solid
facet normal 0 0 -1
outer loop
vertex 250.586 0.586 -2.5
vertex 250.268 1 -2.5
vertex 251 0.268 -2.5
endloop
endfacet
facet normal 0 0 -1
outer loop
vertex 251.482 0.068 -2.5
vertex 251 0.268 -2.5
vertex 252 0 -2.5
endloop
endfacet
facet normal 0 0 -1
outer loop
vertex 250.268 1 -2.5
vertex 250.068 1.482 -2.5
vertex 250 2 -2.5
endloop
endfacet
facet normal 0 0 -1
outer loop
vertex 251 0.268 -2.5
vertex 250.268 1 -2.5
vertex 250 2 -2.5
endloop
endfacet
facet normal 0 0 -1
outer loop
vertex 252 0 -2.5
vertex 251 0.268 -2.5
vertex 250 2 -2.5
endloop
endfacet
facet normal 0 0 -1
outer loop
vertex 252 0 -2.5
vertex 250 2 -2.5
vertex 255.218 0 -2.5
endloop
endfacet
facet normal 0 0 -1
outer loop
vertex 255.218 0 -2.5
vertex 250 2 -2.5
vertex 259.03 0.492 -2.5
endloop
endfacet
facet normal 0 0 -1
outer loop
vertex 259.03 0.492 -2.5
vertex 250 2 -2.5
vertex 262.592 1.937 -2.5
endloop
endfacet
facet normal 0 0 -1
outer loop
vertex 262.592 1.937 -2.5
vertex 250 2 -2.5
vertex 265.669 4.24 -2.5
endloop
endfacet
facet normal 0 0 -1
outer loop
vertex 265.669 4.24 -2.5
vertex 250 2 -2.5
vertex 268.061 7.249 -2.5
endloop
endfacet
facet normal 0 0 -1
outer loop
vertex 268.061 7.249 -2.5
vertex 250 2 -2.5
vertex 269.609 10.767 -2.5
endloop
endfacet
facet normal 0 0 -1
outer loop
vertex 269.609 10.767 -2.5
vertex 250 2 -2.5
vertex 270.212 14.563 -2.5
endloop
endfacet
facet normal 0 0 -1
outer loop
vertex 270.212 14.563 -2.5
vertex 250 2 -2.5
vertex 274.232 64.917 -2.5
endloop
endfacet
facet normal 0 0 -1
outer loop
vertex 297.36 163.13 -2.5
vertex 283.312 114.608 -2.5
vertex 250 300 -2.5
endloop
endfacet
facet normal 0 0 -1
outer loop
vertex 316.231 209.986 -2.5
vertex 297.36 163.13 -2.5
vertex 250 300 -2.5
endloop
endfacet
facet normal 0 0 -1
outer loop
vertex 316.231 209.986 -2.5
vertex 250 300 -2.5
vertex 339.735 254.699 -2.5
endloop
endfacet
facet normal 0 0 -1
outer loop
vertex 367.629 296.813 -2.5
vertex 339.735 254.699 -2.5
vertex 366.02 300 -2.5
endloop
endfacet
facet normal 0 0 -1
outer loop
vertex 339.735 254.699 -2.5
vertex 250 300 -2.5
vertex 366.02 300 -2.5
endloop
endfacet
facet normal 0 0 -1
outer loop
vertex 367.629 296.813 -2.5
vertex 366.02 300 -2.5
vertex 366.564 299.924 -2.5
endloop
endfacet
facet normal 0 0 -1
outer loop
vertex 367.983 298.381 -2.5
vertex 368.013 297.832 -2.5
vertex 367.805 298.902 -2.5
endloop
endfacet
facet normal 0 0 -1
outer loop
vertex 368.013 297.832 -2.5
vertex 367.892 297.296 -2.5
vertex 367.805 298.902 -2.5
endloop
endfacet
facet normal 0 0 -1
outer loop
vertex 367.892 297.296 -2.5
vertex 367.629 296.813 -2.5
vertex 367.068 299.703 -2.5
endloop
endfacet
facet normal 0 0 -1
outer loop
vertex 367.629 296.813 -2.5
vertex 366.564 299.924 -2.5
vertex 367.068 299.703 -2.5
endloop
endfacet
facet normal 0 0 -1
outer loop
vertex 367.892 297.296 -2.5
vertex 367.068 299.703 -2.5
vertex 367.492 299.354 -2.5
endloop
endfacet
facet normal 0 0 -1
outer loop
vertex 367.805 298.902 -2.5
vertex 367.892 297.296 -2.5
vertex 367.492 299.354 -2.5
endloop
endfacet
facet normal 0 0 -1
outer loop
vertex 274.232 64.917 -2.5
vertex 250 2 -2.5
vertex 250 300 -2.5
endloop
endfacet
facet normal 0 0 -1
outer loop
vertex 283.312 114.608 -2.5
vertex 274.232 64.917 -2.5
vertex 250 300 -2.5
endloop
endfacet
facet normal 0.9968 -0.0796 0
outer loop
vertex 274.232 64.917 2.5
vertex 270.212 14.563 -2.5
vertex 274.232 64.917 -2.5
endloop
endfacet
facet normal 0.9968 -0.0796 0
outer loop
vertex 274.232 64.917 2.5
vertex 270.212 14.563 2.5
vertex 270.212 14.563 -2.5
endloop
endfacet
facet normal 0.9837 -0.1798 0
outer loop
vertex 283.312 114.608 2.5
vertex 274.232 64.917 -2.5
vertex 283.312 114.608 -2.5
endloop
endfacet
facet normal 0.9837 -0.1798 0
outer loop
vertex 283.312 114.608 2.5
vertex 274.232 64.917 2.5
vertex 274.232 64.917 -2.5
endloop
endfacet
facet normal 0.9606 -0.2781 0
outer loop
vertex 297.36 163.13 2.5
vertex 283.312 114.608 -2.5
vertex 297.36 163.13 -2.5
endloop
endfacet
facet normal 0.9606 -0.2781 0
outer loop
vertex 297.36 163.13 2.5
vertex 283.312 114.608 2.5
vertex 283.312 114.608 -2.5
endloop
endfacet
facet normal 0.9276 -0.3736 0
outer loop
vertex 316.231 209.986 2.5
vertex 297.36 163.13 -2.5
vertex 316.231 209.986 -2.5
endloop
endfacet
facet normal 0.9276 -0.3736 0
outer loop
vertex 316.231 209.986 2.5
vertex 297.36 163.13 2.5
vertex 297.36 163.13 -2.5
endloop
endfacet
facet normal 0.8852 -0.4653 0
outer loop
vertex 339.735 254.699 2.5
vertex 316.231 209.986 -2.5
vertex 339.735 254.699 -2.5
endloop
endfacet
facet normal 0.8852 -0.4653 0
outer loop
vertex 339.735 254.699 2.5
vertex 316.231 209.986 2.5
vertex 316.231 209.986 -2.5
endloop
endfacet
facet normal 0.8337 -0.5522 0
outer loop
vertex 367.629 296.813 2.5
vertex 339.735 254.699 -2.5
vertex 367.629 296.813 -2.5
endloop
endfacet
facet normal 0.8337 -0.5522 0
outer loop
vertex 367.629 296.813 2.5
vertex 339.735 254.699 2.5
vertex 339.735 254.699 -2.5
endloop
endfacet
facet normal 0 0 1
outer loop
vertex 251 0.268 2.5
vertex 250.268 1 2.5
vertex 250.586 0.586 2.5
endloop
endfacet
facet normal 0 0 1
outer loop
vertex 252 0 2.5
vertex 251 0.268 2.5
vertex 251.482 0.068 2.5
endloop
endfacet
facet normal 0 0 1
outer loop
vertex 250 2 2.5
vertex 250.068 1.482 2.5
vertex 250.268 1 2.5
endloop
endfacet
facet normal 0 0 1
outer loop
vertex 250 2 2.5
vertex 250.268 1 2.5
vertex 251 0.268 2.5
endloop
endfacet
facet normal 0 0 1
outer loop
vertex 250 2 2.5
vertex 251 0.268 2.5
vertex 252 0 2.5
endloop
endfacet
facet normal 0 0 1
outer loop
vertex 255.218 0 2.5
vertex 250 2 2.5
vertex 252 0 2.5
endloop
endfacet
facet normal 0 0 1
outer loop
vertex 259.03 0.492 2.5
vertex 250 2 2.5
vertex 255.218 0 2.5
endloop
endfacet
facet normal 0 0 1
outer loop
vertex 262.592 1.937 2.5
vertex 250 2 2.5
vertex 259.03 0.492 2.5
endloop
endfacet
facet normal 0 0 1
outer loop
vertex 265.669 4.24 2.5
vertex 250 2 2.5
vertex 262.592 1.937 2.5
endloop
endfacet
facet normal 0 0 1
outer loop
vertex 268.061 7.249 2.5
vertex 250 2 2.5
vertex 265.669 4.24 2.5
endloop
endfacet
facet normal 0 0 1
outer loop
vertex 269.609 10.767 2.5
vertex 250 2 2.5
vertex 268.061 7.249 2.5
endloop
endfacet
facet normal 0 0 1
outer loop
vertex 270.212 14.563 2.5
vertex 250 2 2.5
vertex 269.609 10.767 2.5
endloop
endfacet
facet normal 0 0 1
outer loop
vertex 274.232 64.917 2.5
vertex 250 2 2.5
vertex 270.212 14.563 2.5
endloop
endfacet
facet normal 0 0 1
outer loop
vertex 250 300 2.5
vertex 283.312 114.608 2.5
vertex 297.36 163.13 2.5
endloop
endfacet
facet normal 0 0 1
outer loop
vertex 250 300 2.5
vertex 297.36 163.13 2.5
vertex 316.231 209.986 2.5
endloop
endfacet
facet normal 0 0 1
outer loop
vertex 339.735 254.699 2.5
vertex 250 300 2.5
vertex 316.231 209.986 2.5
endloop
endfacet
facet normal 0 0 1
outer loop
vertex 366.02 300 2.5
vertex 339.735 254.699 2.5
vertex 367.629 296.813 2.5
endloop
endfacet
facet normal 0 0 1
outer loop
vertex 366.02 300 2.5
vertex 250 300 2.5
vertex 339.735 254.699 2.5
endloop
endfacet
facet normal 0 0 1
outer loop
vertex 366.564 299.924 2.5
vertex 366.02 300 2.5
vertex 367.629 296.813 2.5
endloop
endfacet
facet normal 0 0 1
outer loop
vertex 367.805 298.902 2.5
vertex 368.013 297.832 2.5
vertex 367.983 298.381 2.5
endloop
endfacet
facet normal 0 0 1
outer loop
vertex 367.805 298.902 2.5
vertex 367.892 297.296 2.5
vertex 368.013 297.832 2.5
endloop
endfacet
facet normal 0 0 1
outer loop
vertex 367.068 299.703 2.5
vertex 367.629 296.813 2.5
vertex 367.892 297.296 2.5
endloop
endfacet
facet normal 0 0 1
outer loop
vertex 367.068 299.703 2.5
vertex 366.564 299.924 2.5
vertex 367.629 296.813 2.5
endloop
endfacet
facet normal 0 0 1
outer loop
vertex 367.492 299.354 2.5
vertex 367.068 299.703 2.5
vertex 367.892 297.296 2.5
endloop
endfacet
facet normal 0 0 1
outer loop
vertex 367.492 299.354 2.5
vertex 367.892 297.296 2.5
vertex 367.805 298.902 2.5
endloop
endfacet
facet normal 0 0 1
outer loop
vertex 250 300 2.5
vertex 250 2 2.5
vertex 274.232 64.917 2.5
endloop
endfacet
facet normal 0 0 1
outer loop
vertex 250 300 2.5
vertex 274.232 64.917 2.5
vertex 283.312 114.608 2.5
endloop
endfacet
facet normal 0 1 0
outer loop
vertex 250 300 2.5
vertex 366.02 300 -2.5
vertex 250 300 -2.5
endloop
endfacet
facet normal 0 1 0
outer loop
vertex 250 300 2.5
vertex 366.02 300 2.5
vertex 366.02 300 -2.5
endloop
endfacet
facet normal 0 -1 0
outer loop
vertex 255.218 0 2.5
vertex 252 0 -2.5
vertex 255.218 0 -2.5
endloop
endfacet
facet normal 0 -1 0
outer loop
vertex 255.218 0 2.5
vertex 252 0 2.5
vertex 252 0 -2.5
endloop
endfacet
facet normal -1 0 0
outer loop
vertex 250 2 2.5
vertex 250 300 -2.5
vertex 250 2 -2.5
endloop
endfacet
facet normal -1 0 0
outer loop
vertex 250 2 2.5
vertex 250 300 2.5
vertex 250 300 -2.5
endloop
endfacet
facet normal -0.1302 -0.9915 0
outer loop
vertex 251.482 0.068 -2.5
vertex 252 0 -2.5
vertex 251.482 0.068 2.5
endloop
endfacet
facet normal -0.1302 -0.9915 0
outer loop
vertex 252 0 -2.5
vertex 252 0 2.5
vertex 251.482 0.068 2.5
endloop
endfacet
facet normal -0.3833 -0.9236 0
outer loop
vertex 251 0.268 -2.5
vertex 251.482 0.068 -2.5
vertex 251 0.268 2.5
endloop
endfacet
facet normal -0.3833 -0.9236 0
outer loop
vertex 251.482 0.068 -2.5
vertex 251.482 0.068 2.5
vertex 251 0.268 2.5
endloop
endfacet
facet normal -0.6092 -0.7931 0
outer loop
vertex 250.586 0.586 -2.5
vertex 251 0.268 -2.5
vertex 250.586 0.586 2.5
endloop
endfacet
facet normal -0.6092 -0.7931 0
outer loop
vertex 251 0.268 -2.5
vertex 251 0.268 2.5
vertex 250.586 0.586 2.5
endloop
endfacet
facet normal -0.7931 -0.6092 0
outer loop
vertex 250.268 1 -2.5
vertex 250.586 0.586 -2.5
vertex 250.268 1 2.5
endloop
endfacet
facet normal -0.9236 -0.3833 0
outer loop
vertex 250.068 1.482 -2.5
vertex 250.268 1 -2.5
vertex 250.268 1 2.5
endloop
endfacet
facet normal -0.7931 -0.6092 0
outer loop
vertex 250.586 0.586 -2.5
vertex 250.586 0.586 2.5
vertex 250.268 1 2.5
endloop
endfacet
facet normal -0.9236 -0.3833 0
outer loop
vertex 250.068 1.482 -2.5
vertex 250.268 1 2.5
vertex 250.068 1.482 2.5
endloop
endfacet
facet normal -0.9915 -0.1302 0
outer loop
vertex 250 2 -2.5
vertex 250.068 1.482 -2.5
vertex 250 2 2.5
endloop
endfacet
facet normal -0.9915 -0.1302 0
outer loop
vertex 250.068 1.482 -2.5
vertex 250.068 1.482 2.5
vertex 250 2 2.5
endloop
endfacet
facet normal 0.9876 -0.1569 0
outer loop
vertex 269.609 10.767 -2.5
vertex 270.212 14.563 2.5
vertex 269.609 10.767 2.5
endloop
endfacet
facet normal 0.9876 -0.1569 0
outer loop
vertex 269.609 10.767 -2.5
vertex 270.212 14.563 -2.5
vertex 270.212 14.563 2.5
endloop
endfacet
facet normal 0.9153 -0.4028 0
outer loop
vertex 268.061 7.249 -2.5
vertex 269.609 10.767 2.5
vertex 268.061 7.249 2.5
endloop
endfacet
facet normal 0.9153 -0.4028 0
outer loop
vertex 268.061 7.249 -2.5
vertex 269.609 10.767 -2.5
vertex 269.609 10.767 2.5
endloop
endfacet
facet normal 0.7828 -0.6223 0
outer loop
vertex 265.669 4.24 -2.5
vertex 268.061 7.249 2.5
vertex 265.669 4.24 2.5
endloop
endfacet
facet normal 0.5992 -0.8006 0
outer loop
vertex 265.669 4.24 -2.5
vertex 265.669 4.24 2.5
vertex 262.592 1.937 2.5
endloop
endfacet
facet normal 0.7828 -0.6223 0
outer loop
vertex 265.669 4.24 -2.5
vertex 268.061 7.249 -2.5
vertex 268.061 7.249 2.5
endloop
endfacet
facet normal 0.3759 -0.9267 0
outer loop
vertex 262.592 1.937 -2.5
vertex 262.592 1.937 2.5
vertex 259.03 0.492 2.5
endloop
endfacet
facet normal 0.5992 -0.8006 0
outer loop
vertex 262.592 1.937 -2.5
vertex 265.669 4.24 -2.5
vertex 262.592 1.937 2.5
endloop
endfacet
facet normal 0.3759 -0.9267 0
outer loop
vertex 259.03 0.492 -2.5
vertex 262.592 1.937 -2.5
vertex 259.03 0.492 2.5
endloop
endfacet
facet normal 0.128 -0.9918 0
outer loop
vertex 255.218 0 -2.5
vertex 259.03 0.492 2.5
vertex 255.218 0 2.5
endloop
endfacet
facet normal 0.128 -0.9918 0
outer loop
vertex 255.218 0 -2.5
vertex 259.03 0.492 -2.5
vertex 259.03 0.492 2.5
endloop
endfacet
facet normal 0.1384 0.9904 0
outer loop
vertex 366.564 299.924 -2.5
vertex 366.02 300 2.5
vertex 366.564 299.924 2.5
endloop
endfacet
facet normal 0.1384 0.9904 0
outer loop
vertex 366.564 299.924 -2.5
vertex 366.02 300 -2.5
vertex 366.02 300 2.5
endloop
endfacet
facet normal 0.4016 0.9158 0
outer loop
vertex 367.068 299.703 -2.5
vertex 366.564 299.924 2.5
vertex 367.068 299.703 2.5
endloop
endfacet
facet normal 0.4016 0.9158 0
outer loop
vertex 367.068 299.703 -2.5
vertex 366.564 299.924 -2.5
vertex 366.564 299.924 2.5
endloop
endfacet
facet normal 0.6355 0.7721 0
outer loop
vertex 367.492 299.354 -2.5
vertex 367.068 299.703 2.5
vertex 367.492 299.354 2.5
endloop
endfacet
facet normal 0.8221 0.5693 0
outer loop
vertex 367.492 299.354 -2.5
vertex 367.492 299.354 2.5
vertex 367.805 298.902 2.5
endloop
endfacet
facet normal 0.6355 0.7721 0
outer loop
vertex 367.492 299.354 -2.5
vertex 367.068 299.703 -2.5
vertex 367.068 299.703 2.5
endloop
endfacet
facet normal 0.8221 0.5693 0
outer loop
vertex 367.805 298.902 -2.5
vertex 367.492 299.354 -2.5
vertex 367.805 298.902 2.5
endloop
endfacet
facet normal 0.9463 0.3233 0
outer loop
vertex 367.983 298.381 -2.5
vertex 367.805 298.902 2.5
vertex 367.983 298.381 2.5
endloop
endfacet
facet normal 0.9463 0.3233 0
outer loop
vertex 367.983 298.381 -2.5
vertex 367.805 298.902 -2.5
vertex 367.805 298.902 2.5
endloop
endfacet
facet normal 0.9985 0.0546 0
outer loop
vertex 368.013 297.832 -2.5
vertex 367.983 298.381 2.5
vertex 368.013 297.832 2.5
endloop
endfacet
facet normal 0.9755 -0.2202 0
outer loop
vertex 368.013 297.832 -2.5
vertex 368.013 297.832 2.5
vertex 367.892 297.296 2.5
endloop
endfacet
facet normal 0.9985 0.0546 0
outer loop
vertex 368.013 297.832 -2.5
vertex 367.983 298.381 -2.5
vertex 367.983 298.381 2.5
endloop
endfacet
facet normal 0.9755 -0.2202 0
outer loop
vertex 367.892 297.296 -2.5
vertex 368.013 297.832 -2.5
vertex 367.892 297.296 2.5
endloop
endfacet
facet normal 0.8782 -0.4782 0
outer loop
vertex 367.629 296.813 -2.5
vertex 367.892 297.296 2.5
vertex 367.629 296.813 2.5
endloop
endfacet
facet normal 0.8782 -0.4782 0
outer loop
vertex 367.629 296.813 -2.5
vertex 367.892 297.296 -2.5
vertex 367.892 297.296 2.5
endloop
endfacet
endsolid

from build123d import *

# Parameters (mm, degrees)
F0_R     = 19.626039
F1_DEPTH = 2.5
F2_R     = 2
F3_R     = 15


with BuildPart() as f1:
    # F0 (on Top) → F1 (new body, symmetric)
    with BuildSketch(Plane.XY):
        with BuildLine():
            Line((370, 300), (250, 300))
            Line((250, 300), (250, 0))
            Line((250, 0), (270, 0))
            ThreePointArc((270, 0), (295.658351, 158.113883), (370, 300))
        make_face()
        with Locations((294.626039, 255.373961)):
            Circle(F0_R, mode=Mode.SUBTRACT)
        with Locations((294.626039, 255.373961)):
            Circle(F0_R)
    extrude(amount=F1_DEPTH, both=True)

    # F2
    f2_edges = [f1.edges().sort_by_distance(p)[0] for p in [
        (250, 0, 0),
        (370, 300, 0),
    ]]
    fillet(f2_edges, radius=F2_R)

    # F3
    f3_edges = [f1.edges().sort_by_distance(p)[0] for p in [
        (270, 0, 0),
    ]]
    fillet(f3_edges, radius=F3_R)


solid = f1.part
